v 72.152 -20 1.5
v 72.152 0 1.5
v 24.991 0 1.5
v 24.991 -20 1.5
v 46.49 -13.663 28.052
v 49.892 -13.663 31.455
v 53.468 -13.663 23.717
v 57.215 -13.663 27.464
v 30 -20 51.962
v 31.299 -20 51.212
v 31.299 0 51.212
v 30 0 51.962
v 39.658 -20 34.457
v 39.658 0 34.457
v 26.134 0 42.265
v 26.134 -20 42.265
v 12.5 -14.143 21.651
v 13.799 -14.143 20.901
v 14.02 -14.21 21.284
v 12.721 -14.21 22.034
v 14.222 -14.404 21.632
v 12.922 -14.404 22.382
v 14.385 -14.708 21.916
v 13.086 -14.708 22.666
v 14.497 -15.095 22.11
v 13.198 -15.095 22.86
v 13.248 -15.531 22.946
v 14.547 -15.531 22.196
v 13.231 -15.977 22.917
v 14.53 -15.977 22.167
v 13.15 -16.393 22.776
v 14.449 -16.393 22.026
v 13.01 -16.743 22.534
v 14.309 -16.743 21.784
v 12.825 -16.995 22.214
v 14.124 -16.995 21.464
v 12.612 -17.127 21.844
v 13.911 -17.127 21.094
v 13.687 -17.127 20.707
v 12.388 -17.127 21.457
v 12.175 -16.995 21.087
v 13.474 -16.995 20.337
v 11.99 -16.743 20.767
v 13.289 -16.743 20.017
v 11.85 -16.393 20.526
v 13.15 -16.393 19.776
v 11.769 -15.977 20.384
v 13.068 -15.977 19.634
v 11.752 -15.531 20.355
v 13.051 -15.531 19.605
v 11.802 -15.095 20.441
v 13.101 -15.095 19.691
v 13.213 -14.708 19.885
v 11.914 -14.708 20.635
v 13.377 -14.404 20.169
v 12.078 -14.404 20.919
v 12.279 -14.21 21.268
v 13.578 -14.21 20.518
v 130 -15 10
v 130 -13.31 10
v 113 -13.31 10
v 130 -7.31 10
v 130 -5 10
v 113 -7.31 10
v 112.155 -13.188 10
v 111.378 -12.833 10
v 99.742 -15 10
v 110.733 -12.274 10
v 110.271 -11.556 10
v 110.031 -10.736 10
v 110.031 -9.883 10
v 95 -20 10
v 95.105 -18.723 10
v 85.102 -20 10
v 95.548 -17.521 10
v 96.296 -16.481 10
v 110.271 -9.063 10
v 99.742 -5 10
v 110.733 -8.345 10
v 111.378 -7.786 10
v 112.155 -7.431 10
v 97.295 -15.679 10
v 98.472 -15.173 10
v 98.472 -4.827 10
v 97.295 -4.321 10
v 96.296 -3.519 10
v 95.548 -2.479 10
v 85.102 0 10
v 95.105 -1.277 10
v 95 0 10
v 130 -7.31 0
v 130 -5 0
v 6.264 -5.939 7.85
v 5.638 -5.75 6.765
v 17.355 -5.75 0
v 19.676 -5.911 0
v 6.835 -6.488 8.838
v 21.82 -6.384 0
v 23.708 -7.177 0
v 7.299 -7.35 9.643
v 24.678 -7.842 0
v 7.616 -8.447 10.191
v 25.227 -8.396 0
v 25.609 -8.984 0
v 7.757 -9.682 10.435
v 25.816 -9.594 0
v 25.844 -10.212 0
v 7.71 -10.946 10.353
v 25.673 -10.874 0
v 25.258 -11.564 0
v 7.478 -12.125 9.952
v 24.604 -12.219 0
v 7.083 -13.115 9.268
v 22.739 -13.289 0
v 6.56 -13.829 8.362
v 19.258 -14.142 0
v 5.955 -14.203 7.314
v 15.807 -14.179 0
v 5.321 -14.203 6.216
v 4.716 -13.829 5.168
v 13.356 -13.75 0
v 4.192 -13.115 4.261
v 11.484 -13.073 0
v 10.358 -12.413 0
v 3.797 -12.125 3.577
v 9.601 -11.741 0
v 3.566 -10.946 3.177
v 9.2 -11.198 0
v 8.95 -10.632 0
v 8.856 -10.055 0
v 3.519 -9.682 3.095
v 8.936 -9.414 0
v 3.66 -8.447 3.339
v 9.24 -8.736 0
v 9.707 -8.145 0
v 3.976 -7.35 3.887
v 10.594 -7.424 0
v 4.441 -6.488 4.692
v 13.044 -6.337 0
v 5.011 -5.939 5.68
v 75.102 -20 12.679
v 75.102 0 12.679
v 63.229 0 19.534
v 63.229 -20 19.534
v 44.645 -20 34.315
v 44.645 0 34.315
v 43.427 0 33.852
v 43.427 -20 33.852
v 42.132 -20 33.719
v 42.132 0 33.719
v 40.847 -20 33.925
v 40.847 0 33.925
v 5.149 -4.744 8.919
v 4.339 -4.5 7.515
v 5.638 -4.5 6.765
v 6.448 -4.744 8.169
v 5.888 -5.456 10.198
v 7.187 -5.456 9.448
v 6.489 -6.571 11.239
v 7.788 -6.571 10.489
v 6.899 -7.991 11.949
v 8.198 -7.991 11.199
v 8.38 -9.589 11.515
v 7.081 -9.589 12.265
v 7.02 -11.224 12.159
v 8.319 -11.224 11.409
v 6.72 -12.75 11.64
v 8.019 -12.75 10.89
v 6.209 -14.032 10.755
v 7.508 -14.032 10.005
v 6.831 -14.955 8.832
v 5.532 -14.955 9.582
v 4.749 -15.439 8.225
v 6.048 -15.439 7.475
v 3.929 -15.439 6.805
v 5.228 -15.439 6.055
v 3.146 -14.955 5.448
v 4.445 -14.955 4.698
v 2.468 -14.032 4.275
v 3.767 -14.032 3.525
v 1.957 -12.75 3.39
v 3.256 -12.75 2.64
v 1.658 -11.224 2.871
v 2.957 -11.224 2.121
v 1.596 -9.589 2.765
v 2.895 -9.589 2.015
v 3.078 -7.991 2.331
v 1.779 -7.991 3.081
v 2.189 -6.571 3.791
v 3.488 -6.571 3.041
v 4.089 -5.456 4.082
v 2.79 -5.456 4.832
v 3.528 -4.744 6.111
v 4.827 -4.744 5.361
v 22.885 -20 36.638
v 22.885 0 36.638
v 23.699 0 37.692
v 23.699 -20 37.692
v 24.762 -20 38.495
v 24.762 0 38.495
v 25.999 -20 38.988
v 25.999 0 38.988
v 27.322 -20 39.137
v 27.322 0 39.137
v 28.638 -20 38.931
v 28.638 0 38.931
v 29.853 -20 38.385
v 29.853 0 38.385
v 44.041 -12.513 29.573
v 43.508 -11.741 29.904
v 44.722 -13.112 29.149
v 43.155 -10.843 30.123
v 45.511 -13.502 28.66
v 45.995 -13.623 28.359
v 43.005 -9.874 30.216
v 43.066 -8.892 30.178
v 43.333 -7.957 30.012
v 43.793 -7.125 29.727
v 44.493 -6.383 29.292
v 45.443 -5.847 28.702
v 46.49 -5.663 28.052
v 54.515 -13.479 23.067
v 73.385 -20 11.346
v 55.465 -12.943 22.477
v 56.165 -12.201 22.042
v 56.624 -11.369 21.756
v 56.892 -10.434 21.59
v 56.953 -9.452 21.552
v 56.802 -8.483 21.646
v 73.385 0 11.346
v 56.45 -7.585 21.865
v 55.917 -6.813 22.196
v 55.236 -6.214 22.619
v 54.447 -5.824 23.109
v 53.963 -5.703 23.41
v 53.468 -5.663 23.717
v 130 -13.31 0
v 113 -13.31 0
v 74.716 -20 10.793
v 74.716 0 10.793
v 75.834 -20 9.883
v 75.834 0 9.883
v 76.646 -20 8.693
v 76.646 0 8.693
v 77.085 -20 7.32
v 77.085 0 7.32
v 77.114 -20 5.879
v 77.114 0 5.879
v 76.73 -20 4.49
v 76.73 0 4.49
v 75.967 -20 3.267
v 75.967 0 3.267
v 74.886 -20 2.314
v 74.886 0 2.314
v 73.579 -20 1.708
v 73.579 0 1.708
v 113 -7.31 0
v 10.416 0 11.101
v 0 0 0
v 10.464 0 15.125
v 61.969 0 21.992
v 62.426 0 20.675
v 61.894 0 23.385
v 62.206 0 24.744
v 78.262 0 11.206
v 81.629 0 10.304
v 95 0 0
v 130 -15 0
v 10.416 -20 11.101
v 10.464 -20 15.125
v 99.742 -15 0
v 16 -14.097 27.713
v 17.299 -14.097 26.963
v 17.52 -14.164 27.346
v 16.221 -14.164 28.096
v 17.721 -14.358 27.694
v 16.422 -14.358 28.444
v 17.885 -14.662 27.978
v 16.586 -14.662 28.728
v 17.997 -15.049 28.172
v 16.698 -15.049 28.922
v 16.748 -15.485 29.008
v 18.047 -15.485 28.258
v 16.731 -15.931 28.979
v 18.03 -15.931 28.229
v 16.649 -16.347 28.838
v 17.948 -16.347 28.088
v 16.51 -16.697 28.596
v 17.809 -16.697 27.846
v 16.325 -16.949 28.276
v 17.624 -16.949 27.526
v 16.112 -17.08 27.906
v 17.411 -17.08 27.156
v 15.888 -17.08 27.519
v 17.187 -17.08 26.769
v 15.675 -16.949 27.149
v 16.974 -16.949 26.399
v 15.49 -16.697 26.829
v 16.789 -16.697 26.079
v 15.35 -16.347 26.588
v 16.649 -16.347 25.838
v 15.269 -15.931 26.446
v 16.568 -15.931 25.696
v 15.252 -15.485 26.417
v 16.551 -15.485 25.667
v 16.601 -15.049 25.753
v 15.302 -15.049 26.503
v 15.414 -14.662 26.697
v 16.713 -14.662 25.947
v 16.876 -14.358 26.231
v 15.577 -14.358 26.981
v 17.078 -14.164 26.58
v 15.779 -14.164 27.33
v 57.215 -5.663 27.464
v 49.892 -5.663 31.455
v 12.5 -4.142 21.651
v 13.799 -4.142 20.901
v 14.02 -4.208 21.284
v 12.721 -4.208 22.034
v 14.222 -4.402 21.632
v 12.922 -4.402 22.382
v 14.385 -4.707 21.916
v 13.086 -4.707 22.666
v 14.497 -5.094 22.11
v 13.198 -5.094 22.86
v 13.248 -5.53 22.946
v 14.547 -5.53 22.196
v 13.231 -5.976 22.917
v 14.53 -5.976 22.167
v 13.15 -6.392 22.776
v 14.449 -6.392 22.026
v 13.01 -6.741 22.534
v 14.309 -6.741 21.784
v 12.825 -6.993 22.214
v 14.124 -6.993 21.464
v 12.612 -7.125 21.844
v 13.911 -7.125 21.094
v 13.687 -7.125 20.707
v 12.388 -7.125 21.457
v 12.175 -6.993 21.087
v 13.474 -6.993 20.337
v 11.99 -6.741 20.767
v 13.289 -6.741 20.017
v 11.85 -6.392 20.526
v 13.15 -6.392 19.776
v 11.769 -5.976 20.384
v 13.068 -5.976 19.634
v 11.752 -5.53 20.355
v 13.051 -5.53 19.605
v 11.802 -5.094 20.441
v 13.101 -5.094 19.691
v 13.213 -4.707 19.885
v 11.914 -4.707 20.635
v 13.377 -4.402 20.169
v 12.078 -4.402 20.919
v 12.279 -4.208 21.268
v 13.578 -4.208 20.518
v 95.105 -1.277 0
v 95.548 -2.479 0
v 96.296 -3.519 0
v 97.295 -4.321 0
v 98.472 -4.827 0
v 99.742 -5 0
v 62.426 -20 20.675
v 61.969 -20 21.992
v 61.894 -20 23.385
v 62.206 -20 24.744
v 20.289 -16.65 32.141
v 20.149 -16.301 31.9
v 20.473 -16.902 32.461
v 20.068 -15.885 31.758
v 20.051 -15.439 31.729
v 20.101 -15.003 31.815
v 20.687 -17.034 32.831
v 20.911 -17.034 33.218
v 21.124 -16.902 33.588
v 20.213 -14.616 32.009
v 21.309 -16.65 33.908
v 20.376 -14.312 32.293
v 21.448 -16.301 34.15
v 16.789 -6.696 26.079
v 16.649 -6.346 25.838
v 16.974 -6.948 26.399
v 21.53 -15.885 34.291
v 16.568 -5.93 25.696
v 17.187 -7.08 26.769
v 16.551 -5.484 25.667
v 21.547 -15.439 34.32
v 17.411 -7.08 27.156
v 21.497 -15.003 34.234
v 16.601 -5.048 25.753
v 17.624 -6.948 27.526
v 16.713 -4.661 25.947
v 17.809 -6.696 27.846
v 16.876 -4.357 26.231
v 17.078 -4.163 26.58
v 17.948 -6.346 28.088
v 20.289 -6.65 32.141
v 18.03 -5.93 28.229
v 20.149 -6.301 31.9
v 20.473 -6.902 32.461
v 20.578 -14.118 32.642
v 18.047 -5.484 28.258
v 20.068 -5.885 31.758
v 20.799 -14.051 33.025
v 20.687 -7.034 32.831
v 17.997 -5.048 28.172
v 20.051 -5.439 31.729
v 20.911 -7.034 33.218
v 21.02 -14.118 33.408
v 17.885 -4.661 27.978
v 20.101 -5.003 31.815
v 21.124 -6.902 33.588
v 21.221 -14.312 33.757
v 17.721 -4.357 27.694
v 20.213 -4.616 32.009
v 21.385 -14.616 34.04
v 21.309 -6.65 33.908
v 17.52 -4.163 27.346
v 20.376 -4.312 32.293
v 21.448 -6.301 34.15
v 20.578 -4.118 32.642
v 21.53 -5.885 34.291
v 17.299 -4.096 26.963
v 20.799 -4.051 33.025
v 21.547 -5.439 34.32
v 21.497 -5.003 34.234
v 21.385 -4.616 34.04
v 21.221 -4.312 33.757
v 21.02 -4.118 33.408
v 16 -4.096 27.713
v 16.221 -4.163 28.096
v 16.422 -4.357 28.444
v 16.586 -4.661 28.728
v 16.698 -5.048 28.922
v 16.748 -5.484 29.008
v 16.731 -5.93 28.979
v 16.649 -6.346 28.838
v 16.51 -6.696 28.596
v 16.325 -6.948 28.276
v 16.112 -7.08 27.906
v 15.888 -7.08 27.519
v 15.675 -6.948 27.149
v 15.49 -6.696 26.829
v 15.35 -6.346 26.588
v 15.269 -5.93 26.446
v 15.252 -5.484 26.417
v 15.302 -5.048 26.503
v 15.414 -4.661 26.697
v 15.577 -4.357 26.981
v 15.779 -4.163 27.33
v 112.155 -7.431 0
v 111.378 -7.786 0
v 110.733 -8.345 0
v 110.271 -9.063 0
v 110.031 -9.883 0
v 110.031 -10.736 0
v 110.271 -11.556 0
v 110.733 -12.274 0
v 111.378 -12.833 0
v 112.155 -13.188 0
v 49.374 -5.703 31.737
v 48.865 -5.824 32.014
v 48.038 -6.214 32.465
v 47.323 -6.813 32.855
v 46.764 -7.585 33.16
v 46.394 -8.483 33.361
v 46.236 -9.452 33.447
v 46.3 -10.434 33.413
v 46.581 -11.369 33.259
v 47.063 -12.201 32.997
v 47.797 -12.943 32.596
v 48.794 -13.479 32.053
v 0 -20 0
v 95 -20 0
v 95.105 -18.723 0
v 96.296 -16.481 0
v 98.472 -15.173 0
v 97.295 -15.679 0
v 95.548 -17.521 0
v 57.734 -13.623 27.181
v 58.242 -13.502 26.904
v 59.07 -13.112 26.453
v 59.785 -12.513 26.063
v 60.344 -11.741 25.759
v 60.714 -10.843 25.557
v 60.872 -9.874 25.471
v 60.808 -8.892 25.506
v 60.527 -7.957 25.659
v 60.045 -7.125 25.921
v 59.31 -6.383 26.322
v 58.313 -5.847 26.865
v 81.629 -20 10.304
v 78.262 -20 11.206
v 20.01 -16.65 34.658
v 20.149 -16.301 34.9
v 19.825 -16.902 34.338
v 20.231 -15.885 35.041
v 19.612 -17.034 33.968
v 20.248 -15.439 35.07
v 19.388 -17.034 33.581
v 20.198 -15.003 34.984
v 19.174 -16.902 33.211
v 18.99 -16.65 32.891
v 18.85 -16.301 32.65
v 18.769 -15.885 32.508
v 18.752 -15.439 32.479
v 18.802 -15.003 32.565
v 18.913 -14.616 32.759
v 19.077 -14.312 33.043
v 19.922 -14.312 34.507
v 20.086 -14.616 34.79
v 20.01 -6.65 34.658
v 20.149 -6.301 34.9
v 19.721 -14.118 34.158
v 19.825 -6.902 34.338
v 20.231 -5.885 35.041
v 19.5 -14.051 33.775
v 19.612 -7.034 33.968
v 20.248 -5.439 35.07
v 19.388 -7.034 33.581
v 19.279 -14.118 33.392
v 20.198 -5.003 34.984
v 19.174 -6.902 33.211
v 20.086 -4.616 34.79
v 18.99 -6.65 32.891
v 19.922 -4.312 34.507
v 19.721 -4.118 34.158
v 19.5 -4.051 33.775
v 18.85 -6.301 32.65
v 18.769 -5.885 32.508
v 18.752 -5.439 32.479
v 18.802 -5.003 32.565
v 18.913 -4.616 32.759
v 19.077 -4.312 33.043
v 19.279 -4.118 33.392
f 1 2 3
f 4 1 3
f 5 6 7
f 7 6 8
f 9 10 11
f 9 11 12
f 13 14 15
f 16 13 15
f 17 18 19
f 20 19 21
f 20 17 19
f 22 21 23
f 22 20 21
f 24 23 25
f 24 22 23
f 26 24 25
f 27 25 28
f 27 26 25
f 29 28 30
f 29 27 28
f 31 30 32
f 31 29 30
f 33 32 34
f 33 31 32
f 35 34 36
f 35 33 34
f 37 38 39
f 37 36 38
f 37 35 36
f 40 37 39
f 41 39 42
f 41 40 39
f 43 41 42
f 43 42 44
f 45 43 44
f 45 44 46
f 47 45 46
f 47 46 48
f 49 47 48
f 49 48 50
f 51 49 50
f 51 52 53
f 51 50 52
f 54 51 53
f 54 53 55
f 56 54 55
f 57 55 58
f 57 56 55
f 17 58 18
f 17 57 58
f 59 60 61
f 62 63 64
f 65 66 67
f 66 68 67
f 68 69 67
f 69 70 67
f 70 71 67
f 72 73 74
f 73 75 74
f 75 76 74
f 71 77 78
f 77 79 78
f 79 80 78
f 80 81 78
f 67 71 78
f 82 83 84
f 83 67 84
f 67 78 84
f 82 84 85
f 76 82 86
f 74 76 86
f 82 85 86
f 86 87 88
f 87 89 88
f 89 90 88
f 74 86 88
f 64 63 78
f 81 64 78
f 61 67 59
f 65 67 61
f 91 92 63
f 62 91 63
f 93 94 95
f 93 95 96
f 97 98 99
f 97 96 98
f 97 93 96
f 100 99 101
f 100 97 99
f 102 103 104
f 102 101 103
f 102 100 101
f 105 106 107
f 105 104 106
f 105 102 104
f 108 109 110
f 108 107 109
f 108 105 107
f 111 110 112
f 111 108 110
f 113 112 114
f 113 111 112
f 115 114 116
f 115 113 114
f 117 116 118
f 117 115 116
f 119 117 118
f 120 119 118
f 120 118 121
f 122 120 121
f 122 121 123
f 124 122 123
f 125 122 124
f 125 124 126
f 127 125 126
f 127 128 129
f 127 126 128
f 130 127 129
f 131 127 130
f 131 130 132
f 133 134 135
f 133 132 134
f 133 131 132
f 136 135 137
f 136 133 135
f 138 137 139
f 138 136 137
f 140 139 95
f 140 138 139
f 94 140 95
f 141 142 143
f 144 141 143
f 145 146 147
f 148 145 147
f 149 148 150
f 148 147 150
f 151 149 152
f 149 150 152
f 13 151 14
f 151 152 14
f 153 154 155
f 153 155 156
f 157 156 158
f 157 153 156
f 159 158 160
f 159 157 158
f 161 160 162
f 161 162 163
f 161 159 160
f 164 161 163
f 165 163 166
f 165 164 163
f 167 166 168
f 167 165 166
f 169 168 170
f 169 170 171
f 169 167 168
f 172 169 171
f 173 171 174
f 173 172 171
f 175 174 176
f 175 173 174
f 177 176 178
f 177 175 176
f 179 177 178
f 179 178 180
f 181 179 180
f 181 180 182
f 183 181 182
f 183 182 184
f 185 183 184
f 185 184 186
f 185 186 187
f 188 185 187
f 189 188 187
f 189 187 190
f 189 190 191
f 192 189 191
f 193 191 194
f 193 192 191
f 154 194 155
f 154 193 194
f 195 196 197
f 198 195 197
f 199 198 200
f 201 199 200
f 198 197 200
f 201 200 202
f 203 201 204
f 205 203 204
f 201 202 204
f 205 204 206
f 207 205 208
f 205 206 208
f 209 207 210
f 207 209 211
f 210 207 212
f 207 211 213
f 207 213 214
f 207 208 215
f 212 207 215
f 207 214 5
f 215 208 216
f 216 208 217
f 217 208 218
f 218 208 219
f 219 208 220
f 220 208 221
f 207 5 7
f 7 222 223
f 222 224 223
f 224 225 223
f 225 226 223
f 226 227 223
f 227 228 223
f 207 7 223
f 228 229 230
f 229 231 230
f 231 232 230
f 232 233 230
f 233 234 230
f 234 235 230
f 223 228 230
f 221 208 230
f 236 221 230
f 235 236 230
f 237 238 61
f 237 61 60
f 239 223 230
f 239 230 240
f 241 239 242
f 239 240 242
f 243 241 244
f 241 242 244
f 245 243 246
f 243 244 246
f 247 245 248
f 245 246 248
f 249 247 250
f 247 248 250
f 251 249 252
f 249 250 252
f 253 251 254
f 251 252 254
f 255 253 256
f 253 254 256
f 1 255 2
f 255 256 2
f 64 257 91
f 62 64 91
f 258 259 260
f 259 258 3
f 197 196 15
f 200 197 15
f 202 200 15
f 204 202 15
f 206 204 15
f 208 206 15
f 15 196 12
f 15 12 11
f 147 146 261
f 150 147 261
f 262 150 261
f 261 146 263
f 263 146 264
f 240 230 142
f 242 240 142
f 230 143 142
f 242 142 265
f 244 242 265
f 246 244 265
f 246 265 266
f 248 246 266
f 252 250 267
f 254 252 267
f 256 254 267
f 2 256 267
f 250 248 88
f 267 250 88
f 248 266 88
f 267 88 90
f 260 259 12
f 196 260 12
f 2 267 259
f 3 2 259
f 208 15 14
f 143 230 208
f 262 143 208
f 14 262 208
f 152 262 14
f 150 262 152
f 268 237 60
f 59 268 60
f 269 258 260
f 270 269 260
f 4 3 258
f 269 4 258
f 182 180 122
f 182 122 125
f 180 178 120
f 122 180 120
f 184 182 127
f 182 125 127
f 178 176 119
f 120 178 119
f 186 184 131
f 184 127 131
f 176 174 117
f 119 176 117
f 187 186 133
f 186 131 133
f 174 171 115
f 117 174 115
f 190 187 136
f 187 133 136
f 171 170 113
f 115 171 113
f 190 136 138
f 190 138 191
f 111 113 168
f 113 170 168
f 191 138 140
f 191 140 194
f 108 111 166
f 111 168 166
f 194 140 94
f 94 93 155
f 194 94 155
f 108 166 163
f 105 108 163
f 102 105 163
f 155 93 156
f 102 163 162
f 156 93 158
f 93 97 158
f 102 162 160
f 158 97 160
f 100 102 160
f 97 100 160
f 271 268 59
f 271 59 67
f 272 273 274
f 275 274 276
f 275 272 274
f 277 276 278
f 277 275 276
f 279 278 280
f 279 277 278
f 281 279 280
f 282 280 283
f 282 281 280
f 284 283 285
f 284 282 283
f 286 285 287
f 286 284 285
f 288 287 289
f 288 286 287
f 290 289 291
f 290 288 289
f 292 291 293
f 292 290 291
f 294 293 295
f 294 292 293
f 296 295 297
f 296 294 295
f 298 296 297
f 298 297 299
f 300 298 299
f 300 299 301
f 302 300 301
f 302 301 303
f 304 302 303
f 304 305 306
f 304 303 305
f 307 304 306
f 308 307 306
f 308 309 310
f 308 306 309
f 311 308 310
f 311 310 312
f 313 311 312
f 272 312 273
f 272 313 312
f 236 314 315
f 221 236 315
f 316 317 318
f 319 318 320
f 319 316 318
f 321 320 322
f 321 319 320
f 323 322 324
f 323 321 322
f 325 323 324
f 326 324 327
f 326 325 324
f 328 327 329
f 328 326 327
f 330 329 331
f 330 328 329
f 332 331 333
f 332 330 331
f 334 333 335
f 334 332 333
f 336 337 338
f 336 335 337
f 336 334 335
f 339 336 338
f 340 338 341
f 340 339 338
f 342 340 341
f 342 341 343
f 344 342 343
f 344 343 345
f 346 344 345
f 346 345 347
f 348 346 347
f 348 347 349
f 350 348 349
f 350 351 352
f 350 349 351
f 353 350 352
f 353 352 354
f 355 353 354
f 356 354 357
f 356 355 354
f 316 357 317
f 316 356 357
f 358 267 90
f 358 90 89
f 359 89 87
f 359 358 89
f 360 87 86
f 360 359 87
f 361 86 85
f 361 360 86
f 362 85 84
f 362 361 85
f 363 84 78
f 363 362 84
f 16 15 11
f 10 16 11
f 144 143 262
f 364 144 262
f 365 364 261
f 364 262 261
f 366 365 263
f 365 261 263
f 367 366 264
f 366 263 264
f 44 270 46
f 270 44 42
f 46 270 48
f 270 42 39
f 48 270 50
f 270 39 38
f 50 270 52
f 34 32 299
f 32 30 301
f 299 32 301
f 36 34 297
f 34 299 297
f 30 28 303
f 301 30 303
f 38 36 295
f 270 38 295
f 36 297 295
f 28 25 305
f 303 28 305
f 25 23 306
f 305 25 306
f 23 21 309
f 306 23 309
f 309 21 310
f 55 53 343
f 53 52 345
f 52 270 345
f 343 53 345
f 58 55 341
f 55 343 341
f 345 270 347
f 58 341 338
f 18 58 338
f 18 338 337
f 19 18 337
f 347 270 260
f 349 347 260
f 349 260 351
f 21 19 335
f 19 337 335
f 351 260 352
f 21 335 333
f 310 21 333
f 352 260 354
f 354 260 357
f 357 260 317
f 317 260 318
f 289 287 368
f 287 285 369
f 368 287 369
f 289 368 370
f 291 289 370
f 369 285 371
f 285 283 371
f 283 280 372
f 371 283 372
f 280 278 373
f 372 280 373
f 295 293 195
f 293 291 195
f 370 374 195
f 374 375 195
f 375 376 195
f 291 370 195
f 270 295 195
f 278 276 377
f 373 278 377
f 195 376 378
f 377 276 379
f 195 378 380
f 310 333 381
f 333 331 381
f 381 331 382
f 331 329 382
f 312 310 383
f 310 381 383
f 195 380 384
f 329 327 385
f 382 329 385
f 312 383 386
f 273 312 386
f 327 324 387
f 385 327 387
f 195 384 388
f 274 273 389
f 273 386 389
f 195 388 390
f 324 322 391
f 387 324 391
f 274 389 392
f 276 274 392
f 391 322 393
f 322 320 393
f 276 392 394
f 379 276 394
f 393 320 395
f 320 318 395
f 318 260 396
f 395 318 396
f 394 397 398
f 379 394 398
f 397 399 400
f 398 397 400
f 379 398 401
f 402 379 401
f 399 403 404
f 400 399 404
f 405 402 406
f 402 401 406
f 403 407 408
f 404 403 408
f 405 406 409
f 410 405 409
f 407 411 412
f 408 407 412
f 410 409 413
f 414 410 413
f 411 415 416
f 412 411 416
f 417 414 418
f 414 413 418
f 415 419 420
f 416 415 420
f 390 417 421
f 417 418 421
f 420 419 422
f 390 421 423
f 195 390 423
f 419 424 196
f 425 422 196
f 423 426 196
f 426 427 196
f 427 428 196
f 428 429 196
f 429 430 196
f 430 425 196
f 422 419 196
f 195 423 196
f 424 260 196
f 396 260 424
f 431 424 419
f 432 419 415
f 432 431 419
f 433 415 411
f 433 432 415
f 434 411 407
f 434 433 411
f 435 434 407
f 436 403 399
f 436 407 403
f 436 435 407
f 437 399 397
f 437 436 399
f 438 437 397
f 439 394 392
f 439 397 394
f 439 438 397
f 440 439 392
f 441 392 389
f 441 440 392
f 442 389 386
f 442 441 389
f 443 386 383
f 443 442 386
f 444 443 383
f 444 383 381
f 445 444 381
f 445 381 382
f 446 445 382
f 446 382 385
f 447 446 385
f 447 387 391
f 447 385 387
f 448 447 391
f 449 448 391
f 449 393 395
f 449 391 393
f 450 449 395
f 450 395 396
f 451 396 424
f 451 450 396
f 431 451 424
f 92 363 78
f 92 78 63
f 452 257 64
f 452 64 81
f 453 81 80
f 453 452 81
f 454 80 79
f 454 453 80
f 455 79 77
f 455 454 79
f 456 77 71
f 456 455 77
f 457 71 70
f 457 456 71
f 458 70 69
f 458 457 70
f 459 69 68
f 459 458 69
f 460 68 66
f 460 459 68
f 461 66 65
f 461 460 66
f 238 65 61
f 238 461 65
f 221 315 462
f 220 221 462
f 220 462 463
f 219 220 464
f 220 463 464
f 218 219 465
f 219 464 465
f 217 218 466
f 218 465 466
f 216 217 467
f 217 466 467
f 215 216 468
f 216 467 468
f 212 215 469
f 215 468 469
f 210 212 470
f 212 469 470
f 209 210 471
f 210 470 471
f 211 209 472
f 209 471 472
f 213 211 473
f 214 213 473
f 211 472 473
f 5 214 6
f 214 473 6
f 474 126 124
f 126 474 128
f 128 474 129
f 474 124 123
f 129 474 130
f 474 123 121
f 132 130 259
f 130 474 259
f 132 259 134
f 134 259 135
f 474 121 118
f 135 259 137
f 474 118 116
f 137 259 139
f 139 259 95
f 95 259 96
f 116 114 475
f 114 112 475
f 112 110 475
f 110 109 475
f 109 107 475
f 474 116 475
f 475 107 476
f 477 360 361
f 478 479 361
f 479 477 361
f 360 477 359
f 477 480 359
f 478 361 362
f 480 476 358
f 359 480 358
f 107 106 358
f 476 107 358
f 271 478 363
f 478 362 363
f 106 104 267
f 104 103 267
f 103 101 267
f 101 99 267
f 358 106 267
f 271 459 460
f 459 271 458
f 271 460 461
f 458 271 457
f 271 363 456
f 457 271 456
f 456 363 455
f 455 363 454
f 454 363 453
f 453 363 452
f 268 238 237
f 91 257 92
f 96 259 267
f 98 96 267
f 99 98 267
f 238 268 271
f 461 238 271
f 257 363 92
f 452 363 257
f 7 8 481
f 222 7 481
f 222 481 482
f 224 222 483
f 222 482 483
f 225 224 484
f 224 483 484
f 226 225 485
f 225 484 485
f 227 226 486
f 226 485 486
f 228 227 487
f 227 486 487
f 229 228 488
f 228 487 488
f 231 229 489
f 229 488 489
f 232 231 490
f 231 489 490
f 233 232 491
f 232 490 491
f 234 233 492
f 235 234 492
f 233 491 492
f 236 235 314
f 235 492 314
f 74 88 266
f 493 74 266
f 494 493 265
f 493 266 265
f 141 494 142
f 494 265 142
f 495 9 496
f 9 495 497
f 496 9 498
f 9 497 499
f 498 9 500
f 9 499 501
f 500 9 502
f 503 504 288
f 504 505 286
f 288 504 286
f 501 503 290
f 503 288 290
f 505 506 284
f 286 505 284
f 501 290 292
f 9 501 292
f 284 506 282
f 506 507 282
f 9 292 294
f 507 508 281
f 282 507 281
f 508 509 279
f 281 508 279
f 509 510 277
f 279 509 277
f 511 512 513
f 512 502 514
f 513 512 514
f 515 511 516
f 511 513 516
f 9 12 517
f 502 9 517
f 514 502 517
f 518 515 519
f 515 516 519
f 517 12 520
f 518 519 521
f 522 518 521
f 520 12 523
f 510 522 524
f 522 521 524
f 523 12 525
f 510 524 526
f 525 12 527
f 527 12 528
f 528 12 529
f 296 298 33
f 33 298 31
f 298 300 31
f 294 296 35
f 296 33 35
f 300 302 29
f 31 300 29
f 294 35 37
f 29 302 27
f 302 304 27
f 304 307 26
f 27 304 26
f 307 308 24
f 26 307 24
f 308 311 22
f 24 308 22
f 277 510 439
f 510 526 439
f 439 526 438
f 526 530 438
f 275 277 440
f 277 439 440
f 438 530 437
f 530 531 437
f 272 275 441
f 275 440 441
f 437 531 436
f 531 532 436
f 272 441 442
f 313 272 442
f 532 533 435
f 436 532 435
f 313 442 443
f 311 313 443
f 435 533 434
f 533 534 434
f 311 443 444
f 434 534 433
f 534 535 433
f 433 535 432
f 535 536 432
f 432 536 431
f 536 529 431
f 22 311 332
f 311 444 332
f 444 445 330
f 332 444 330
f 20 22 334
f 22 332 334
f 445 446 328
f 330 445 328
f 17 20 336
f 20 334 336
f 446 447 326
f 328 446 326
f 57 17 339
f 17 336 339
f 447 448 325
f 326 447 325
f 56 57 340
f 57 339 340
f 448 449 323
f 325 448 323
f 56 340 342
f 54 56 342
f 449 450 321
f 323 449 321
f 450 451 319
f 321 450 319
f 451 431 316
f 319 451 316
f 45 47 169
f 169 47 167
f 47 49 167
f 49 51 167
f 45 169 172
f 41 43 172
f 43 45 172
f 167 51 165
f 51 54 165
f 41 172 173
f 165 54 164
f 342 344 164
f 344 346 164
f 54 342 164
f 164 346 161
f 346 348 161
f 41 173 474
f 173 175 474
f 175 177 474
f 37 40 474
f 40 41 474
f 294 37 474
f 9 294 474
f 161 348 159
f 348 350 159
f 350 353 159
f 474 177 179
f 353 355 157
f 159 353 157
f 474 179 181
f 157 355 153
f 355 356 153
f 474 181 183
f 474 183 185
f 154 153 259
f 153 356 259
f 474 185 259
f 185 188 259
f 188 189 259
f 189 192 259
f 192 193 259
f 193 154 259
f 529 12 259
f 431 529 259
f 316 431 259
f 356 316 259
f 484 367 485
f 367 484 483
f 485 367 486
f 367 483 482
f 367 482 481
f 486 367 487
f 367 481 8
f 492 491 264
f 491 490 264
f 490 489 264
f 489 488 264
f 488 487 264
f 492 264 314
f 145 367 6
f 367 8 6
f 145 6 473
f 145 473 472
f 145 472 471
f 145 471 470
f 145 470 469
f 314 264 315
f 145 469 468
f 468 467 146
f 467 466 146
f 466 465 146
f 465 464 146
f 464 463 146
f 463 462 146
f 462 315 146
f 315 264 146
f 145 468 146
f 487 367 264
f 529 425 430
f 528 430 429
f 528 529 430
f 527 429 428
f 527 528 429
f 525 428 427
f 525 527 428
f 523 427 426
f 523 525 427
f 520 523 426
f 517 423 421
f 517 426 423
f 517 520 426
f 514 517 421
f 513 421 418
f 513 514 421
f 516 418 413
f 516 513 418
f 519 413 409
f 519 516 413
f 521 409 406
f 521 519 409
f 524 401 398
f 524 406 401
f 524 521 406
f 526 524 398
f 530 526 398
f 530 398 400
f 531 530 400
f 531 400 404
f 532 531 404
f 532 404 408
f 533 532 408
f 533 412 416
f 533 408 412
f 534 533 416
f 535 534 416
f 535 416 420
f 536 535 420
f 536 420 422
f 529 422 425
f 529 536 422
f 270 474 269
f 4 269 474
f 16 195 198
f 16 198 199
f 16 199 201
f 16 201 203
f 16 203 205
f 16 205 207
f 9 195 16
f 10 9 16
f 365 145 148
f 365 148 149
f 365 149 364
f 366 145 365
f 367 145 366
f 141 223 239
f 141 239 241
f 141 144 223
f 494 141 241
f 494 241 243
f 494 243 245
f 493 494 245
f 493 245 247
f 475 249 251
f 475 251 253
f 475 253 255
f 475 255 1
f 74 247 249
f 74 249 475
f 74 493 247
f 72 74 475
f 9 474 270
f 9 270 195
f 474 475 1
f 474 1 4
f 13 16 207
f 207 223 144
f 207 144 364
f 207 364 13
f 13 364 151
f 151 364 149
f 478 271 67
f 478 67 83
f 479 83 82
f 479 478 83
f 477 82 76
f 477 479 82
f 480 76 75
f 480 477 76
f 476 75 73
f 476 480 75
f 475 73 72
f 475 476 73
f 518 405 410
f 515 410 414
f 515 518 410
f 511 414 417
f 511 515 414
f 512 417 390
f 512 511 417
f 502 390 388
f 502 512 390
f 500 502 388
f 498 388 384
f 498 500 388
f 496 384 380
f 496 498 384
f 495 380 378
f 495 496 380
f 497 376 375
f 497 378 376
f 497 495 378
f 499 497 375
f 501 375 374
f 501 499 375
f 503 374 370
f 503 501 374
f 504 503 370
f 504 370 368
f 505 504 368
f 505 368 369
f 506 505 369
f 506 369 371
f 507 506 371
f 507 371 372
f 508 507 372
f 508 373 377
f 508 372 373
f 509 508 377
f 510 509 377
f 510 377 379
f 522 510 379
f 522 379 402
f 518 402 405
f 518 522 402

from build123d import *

# Parameters (mm, degrees)
F1_DEPTH  = 20
F4_DEPTH  = 50
F5_W      = 17
F5_H      = 6
F6_DEPTH  = 25
F8_R      = 4.25
F8_R_2    = 1.5
F9_DEPTH  = 25
F10_R     = 5.5
F11_DEPTH = 1.5


with BuildPart() as f1:
    # F0 (on Front) → F1 (new body)
    with BuildSketch(Plane.XZ):
        with BuildLine():
            Line((30, 51.9615242271), (0, 0))
            Line((0, 0), (130, 0))
            Line((130, 0), (130, 10))
            Line((130, 10), (85.1020127108, 10))
            ThreePointArc((85.1020127108, 10), (79.9256318088, 10.6814834742), (75.1020127108, 12.6794919243))
            Line((75.1020127108, 12.6794919243), (63.2290110083, 19.5343726533))
            ThreePointArc((63.2290110083, 19.5343726533), (61.9689506821, 21.9921089772), (62.2059384915, 24.7438459998))
            Line((62.2059384915, 24.7438459998), (44.644568833, 34.3145458549))
            ThreePointArc((44.644568833, 34.3145458549), (42.1322366307, 33.719194316), (39.6578564006, 34.4565538122))
            Line((39.6578564006, 34.4565538122), (26.1336276699, 42.2647709104))
            Line((26.1336276699, 42.2647709104), (31.2990381057, 51.2115242271))
            Line((31.2990381057, 51.2115242271), (30, 51.9615242271))
        make_face()
        with BuildLine():
            Line((10.4157161817, 11.1009099437), (10.4642531461, 15.1246181124))
            Line((10.4642531461, 15.1246181124), (22.8849254207, 36.637853556))
            ThreePointArc((22.8849254207, 36.637853556), (25.9989331967, 38.9877044803), (29.8532581245, 38.3851904586))
            Line((29.8532581245, 38.3851904586), (73.3850632782, 11.3456928945))
            ThreePointArc((73.3850632782, 11.3456928945), (77.1137537202, 5.8788979441), (72.1524804727, 1.5))
            Line((72.1524804727, 1.5), (24.9912310392, 1.5))
            Line((24.9912310392, 1.5), (10.4157161817, 11.1009099437))
        make_face(mode=Mode.SUBTRACT)
    extrude(amount=F1_DEPTH)

    # F3 (on face) → F4 (cut)
    with BuildSketch(Plane(origin=(70, 0, 70), x_dir=(0.7071067812, 0, -0.7071067812), z_dir=(0.7071067812, 0, 0.7071067812))):
        with BuildLine():
            ThreePointArc((13.0375107105, -5.6630554804), (9.0375107105, -9.6630554804), (13.0375107105, -13.6630554804))
            Line((13.0375107105, -13.6630554804), (21.0375107105, -13.6630554804))
            ThreePointArc((21.0375107105, -13.6630554804), (25.0375107105, -9.6630554804), (21.0375107105, -5.6630554804))
            Line((21.0375107105, -5.6630554804), (13.0375107105, -5.6630554804))
        make_face()
    extrude(amount=-F4_DEPTH, mode=Mode.SUBTRACT)

    # F5 (on Top) → F6 (cut)
    with BuildSketch(Plane.XY):
        with BuildLine():
            Line((130, 0), (95, 0))
            ThreePointArc((95, 0), (96.2962522412, -3.5190565155), (99.7416600585, -5))
            Line((99.7416600585, -5), (130, -5))
            Line((130, -5), (130, 0))
        make_face()
        with BuildLine():
            ThreePointArc((99.7416600585, -15), (96.2962522412, -16.4809434845), (95, -20))
            Line((95, -20), (130, -20))
            Line((130, -20), (130, -15))
            Line((130, -15), (99.7416600585, -15))
        make_face()
        with Locations((121.5, -10.3095373929)):
            Rectangle(F5_W, F5_H)
        with BuildLine():
            ThreePointArc((113, -7.3095373929), (110, -10.3095373929), (113, -13.3095373929))
            Line((113, -13.3095373929), (113, -7.3095373929))
        make_face()
    extrude(amount=F6_DEPTH, mode=Mode.SUBTRACT)

    # F8 (on face) → F9 (cut)
    with BuildSketch(Plane(origin=(0, 0, 0), x_dir=(0, 1, 0), z_dir=(0.8660254038, 0, -0.5))):
        with Locations((-10, 8.6775068194)):
            Circle(F8_R)
        with Locations((-5.6418100949, 25)):
            Circle(F8_R_2)
        with Locations((-15.6433817795, 25)):
            Circle(F8_R_2)
        with Locations((-5.5963639886, 31.9998524735)):
            Circle(F8_R_2)
        with Locations((-5.5509178823, 38.9997049471)):
            Circle(F8_R_2)
        with Locations((-15.5971498309, 31.9998473274)):
            Circle(F8_R_2)
        with Locations((-15.5509178823, 38.9996946548)):
            Circle(F8_R_2)
    extrude(amount=F9_DEPTH, mode=Mode.SUBTRACT)

    # F10 (on face) → F11 (cut)
    with BuildSketch(Plane(origin=(0, 0, 0), x_dir=(0, 1, 0), z_dir=(0.8660254038, 0, -0.5))):
        with Locations((-10, 8.6775068194)):
            Circle(F10_R)
    extrude(amount=F11_DEPTH, mode=Mode.SUBTRACT)


solid = f1.part
